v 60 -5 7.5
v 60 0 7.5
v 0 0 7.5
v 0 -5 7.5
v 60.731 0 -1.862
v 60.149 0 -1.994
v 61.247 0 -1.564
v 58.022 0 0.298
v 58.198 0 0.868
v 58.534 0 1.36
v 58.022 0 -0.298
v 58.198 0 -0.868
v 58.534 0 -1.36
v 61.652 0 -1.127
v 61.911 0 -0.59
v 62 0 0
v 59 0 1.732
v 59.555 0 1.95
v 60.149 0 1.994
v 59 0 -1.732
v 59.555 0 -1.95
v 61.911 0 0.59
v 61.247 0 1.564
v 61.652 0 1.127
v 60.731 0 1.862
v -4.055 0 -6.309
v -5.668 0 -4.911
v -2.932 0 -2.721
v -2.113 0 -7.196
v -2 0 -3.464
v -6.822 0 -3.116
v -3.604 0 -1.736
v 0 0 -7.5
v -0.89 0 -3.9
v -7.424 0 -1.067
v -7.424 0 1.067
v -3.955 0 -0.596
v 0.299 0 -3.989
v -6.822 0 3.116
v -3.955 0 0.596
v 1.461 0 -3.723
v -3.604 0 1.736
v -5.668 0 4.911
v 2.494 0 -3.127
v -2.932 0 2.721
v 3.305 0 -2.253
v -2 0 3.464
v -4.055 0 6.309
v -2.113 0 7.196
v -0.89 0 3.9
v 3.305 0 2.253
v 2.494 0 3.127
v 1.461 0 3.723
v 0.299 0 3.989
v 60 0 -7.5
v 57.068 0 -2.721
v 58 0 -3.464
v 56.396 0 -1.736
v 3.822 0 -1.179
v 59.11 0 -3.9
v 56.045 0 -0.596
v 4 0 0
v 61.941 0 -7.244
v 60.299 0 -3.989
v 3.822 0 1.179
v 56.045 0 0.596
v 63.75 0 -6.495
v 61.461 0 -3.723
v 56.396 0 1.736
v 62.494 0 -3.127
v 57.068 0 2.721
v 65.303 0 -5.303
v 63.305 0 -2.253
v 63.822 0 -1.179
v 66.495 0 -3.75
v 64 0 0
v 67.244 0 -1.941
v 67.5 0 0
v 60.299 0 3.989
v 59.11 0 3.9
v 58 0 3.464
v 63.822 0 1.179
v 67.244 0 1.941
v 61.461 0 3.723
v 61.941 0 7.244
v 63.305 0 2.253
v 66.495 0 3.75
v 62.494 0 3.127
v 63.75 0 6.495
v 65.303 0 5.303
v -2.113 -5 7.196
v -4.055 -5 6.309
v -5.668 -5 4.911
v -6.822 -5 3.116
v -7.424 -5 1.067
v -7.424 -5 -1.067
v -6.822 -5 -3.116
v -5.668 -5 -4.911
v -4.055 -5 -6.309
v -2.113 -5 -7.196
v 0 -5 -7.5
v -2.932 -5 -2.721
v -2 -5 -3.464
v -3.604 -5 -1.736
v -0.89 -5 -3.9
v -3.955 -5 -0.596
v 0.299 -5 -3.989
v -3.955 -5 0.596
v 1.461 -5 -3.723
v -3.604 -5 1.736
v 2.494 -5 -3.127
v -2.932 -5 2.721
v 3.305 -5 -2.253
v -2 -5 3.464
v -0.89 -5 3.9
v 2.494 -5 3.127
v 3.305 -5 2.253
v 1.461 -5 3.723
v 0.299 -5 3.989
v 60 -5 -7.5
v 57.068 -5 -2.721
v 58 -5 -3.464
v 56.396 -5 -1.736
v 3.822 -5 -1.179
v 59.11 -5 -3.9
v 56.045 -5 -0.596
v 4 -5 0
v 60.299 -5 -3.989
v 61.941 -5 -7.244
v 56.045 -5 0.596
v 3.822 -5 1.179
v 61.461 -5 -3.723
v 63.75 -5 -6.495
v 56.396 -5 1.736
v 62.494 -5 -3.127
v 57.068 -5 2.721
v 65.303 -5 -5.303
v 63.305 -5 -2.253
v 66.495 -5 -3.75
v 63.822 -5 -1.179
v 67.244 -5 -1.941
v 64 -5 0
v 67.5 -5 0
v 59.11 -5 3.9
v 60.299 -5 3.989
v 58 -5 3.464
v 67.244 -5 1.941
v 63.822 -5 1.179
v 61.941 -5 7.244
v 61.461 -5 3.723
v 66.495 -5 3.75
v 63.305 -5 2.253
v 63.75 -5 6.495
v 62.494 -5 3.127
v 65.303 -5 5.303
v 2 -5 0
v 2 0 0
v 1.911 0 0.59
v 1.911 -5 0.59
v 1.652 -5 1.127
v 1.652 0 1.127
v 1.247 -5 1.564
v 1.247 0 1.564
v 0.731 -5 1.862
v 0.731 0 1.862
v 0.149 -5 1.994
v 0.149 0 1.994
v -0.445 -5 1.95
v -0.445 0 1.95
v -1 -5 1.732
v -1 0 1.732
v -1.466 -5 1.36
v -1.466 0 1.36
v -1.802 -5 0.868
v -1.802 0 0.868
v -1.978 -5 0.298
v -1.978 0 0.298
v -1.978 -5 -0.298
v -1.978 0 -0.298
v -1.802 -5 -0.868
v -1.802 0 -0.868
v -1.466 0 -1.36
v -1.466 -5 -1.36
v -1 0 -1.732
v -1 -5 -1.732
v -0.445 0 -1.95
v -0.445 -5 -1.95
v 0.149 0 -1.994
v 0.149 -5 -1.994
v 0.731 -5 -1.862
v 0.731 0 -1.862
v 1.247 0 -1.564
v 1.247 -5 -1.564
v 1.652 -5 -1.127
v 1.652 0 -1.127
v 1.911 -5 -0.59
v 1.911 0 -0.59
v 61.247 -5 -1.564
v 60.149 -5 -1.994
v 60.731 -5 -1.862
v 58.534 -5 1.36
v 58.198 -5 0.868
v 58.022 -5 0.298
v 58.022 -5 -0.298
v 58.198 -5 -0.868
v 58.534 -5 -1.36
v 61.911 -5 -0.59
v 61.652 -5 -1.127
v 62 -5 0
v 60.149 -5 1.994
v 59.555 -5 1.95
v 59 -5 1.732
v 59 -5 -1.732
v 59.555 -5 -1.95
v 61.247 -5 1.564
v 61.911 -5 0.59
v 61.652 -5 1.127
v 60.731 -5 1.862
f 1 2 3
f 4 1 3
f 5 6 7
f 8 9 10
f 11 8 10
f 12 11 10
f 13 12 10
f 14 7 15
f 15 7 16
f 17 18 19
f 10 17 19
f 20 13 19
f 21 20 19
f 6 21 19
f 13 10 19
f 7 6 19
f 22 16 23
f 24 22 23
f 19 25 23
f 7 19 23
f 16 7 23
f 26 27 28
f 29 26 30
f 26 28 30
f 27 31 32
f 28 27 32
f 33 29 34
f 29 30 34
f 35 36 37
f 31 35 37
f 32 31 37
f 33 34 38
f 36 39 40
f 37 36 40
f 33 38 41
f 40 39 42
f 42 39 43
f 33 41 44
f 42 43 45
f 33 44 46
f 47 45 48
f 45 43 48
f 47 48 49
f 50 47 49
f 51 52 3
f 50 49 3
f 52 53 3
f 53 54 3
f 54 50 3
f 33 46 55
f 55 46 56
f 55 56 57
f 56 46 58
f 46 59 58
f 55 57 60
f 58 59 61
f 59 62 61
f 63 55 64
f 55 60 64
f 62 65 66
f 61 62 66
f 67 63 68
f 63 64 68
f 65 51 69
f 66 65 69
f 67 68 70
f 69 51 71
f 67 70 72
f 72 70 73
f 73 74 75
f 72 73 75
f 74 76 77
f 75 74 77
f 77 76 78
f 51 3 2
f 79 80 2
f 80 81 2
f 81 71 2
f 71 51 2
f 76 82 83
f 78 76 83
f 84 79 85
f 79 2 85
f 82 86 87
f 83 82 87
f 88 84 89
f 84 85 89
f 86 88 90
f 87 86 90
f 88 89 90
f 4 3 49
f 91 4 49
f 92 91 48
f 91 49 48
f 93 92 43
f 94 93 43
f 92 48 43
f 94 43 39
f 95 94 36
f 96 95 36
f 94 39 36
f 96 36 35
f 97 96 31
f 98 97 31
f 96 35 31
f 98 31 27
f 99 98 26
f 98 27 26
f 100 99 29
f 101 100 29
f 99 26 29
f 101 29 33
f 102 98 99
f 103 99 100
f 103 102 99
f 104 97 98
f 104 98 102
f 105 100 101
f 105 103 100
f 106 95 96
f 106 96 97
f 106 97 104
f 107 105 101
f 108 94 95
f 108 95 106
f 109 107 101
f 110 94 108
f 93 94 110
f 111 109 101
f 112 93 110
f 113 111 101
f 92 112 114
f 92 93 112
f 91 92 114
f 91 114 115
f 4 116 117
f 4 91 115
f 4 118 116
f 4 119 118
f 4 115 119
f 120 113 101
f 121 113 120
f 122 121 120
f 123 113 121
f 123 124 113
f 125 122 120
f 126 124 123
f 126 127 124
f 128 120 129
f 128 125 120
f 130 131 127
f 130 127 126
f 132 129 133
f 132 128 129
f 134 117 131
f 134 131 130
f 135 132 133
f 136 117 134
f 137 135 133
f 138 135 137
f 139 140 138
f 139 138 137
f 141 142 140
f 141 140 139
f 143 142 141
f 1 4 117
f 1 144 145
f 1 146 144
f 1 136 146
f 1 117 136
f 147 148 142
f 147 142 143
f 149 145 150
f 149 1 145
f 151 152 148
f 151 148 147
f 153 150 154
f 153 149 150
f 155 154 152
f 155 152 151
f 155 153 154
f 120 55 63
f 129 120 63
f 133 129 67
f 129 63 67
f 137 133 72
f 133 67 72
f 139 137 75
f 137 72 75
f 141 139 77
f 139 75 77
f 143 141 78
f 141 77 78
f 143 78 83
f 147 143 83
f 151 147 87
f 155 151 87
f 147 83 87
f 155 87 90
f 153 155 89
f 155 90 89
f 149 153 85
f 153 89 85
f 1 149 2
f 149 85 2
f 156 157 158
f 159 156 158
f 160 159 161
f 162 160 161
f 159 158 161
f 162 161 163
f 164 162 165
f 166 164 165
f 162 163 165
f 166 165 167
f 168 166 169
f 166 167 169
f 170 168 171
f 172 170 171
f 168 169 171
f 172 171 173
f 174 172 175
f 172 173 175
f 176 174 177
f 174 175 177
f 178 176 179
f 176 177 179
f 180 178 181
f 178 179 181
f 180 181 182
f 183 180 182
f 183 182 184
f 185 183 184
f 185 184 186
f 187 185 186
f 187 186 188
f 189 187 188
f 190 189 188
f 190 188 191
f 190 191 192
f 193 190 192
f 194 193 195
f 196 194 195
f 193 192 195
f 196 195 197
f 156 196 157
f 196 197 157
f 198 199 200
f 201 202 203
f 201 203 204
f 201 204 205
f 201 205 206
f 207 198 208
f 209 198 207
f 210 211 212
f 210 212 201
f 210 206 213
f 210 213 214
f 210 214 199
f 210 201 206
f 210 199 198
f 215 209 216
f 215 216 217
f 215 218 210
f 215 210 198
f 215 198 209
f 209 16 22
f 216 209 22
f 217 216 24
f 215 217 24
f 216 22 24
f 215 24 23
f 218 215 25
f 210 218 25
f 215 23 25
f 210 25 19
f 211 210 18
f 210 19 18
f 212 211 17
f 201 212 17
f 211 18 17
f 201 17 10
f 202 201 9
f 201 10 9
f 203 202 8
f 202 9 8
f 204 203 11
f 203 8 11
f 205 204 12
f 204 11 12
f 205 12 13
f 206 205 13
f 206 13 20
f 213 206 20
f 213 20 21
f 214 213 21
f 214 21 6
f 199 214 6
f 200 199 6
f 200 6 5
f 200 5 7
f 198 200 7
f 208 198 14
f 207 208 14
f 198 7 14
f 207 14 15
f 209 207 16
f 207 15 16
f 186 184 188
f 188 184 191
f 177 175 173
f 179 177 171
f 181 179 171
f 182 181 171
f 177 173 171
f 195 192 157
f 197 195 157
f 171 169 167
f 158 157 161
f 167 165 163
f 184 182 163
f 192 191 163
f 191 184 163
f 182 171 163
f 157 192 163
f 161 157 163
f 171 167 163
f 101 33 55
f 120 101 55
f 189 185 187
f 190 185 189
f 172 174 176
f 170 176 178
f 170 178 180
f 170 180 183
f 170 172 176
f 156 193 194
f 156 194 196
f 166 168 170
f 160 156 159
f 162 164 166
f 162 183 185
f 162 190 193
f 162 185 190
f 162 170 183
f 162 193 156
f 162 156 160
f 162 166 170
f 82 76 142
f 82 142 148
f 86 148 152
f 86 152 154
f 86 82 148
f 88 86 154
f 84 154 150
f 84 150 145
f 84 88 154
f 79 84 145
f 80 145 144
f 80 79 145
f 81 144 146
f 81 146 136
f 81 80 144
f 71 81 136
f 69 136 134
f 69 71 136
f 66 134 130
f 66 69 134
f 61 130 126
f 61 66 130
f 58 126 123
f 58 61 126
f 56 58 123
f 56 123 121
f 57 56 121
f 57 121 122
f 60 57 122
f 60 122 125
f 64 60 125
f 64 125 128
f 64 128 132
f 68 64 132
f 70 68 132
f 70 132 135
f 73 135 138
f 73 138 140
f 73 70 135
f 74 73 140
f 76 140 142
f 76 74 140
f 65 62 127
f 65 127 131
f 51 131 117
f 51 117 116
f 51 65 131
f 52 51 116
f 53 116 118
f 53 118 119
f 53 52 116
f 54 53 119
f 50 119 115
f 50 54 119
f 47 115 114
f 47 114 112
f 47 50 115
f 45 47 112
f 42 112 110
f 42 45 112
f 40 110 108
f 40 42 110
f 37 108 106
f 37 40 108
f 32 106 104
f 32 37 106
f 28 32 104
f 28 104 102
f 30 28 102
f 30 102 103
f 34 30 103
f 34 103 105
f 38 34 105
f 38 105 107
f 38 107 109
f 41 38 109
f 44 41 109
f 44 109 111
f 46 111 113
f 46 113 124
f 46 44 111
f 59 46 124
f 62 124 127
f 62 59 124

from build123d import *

# Parameters (mm, degrees)
F0_R     = 4
F0_R_2   = 2
F1_DEPTH = 5


with BuildPart() as f1:
    # F0 (on Front) → F1 (new body)
    with BuildSketch(Plane.XZ):
        with BuildLine():
            ThreePointArc((0, -7.5), (5.303301, -5.303301), (7.5, 0))
            ThreePointArc((7.5, 0), (5.303301, 5.303301), (0, 7.5))
            ThreePointArc((0, 7.5), (-7.5, 0), (0, -7.5))
        make_face()
        Circle(F0_R, mode=Mode.SUBTRACT)
        with BuildLine():
            ThreePointArc((0, 7.5), (5.303301, 5.303301), (7.5, 0))
            ThreePointArc((7.5, 0), (5.303301, -5.303301), (0, -7.5))
            Line((0, -7.5), (60, -7.5))
            ThreePointArc((60, -7.5), (52.5, 0), (60, 7.5))
            Line((60, 7.5), (0, 7.5))
        make_face()
        with BuildLine():
            ThreePointArc((67.5, 0), (65.303301, 5.303301), (60, 7.5))
            ThreePointArc((60, 7.5), (52.5, 0), (60, -7.5))
            ThreePointArc((60, -7.5), (65.303301, -5.303301), (67.5, 0))
        make_face()
        with Locations((60, 0)):
            Circle(F0_R, mode=Mode.SUBTRACT)
        with Locations((60, 0)):
            Circle(F0_R_2)
        Circle(F0_R_2)
    extrude(amount=F1_DEPTH)


solid = f1.part
